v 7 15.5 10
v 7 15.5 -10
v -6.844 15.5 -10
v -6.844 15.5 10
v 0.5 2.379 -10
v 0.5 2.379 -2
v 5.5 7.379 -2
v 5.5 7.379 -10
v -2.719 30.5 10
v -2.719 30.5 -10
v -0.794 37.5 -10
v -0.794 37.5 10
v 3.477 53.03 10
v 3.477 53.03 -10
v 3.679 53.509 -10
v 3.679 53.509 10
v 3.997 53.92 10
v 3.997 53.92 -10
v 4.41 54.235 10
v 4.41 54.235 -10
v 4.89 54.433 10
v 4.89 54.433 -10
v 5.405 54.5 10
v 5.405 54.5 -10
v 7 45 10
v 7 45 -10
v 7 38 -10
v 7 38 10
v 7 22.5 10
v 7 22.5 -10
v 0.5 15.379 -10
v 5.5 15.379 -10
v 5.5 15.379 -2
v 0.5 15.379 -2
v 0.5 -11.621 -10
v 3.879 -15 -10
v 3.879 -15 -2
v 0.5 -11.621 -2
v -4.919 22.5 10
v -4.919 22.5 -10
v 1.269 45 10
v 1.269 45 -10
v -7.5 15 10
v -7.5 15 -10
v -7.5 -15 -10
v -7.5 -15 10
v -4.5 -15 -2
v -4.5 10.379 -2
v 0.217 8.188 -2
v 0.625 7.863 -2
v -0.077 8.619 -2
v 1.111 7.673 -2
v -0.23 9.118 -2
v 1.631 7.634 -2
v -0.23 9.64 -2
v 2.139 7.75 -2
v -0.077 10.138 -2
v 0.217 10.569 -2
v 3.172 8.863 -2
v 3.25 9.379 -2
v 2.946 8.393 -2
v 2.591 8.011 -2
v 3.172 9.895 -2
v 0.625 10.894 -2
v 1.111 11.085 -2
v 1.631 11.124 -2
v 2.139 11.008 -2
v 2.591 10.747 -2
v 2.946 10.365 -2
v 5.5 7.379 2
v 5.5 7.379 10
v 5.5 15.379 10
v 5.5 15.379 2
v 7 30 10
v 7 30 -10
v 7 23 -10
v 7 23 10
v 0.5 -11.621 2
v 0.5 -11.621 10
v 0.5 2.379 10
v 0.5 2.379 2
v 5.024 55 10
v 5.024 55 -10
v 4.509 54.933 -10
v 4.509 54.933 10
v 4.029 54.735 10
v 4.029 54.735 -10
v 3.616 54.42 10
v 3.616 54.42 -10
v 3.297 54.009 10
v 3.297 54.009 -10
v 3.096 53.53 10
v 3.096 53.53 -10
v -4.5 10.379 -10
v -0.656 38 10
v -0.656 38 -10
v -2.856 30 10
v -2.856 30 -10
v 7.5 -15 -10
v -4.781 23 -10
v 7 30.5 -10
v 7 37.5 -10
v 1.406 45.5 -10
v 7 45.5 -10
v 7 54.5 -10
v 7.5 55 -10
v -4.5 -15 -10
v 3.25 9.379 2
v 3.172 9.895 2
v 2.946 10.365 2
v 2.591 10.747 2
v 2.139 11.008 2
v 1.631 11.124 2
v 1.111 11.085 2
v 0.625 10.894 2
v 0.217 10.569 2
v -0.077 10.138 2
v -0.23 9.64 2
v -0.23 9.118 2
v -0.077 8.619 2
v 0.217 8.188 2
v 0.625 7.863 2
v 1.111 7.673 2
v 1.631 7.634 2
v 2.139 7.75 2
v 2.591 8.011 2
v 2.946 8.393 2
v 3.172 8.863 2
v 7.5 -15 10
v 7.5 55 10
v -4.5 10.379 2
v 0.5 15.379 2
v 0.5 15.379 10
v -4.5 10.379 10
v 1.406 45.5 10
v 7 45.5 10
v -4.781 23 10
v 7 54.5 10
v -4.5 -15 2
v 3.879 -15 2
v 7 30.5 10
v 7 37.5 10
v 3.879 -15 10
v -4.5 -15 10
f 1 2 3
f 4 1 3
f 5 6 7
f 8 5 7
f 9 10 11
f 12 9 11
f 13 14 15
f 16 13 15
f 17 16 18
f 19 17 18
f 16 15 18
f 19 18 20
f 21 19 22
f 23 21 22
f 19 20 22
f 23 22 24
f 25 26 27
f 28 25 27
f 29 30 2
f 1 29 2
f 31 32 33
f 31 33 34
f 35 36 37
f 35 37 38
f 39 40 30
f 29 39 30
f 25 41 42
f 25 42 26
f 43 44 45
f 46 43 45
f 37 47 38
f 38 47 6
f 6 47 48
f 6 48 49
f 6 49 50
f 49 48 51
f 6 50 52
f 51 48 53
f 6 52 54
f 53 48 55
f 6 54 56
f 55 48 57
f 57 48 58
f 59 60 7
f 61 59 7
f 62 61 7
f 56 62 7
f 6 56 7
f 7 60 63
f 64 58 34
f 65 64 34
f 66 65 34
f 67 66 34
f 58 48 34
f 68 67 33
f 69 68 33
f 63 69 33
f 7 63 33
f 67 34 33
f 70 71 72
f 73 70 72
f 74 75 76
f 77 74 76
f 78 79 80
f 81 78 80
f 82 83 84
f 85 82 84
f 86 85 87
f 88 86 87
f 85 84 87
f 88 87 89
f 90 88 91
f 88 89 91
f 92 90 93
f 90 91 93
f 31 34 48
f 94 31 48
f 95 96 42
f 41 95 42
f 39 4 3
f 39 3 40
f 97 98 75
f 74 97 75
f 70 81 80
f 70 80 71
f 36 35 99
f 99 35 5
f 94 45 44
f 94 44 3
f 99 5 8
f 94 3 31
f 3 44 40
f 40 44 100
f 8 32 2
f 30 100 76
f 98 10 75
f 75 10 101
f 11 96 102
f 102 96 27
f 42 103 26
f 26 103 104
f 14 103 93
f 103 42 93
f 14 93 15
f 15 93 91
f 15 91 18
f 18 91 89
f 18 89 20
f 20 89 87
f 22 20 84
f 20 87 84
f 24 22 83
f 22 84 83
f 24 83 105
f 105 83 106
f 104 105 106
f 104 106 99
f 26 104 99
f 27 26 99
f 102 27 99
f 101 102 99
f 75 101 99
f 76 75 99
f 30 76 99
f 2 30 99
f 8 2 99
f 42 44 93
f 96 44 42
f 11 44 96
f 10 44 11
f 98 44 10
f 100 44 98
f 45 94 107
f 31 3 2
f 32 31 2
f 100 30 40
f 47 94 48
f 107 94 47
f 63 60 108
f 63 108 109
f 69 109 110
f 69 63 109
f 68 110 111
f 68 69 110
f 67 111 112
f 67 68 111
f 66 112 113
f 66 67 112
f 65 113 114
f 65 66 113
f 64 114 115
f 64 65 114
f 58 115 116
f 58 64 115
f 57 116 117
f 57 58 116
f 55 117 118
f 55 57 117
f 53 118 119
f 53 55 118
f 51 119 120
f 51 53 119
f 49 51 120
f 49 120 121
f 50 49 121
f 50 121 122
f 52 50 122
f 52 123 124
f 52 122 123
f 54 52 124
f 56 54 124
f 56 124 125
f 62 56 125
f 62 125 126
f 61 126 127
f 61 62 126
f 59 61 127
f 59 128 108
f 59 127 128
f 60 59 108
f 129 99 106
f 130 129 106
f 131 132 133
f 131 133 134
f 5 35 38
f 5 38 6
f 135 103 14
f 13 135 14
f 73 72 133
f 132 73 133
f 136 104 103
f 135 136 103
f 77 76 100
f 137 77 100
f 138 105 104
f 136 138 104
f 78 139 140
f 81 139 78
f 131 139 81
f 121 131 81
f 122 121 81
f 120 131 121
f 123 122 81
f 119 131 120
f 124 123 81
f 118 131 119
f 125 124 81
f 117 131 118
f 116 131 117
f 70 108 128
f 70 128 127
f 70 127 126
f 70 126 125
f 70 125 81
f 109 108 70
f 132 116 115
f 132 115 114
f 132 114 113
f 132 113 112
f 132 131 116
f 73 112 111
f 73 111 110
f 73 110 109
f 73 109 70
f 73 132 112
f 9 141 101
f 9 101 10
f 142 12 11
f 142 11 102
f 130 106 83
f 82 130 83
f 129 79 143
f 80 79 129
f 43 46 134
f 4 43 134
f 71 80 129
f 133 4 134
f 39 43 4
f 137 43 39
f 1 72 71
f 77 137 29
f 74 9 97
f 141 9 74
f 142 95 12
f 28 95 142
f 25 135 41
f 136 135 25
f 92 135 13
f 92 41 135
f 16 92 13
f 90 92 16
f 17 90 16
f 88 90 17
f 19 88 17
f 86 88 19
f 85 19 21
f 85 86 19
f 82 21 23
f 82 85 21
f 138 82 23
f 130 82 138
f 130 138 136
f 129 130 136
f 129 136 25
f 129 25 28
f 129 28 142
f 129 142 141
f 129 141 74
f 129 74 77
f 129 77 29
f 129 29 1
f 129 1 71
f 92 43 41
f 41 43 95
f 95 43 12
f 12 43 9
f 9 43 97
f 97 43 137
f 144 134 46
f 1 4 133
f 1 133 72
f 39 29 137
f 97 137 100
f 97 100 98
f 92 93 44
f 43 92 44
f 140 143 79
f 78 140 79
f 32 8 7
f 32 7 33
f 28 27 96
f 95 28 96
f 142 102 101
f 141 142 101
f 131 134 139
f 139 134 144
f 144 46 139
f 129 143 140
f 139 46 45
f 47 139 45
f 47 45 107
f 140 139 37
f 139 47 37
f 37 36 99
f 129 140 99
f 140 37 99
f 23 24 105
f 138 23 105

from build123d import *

# Parameters (mm, degrees)
BOSS_EXTRUDE1_DEPTH      = 10
BOSS_EXTRUDE1_DEPTH_BACK = 10
CUT_EXTRUDE1_DEPTH       = 8
CUT_EXTRUDE2_DEPTH       = 57.402570863
CUT_EXTRUDE2_DEPTH_BACK  = 57.402570863
SKETCH4_R                = 1.75


with BuildPart() as part:
    # Sketch1 → Boss-Extrude1 (new, two sides: drawn at the far end of the back side and taken through both)
    with BuildSketch(Plane.XY.offset(-BOSS_EXTRUDE1_DEPTH_BACK)):
        with BuildLine():
            Line((7.5, -15), (7.5, 15))
            Line((7.5, 15), (7.5, 55))
            Line((7.5, 55), (5.024246851, 55))
            ThreePointArc((5.024246851, 55), (3.811940358, 54.590695749), (3.095836066, 53.530312966))
            Line((3.095836066, 53.530312966), (-7.5, 15))
            Line((-7.5, 15), (-7.5, -15))
            Line((-7.5, -15), (7.5, -15))
        make_face()
        Polygon((7, 15.5), (-6.843938287, 15.5), (-4.918938287, 22.5), (7, 22.5), align=None, mode=Mode.SUBTRACT)
        Polygon((7, 30), (7, 23), (-4.781438287, 23), (-2.856438287, 30), align=None, mode=Mode.SUBTRACT)
        Polygon((7, 37.5), (7, 30.5), (-2.718938287, 30.5), (-0.793938287, 37.5), align=None, mode=Mode.SUBTRACT)
        Polygon((7, 38), (-0.656438287, 38), (1.268561713, 45), (7, 45), align=None, mode=Mode.SUBTRACT)
        with BuildLine():
            ThreePointArc((3.476897778, 53.030312966), (4.193002071, 54.090695749), (5.405308564, 54.5))
            Line((5.405308564, 54.5), (7, 54.5))
            Line((7, 54.5), (7, 45.5))
            Line((7, 45.5), (1.406061713, 45.5))
            Line((1.406061713, 45.5), (3.476897778, 53.030312966))
        make_face(mode=Mode.SUBTRACT)
    extrude(amount=BOSS_EXTRUDE1_DEPTH + BOSS_EXTRUDE1_DEPTH_BACK)

    # Sketch2 → Cut-Extrude1 (cut)
    with BuildSketch(Plane.XY.offset(10)):
        Polygon((5.5, 7.378745231), (5.5, 15.378745231), (0.5, 15.378745231), (-4.5, 10.378745231), (-4.5, -15.621254769), (4.5, -15.621254769), (0.5, -11.621254769), (0.5, 2.378745231), align=None)
    cut_extrude1 = extrude(amount=-CUT_EXTRUDE1_DEPTH, mode=Mode.SUBTRACT)

    # Mirror1: Cut-Extrude1 across plane
    add(cut_extrude1.mirror(Plane.XY), mode=Mode.SUBTRACT)

    # Sketch4 → Cut-Extrude2 (cut, two sides: drawn at the far end of the back side and taken through both)
    with BuildSketch(Plane.XY.offset(-CUT_EXTRUDE2_DEPTH_BACK)):
        with Locations((1.5, 9.378745231)):
            Circle(SKETCH4_R)
    extrude(amount=CUT_EXTRUDE2_DEPTH + CUT_EXTRUDE2_DEPTH_BACK, mode=Mode.SUBTRACT)


solid = part.part
